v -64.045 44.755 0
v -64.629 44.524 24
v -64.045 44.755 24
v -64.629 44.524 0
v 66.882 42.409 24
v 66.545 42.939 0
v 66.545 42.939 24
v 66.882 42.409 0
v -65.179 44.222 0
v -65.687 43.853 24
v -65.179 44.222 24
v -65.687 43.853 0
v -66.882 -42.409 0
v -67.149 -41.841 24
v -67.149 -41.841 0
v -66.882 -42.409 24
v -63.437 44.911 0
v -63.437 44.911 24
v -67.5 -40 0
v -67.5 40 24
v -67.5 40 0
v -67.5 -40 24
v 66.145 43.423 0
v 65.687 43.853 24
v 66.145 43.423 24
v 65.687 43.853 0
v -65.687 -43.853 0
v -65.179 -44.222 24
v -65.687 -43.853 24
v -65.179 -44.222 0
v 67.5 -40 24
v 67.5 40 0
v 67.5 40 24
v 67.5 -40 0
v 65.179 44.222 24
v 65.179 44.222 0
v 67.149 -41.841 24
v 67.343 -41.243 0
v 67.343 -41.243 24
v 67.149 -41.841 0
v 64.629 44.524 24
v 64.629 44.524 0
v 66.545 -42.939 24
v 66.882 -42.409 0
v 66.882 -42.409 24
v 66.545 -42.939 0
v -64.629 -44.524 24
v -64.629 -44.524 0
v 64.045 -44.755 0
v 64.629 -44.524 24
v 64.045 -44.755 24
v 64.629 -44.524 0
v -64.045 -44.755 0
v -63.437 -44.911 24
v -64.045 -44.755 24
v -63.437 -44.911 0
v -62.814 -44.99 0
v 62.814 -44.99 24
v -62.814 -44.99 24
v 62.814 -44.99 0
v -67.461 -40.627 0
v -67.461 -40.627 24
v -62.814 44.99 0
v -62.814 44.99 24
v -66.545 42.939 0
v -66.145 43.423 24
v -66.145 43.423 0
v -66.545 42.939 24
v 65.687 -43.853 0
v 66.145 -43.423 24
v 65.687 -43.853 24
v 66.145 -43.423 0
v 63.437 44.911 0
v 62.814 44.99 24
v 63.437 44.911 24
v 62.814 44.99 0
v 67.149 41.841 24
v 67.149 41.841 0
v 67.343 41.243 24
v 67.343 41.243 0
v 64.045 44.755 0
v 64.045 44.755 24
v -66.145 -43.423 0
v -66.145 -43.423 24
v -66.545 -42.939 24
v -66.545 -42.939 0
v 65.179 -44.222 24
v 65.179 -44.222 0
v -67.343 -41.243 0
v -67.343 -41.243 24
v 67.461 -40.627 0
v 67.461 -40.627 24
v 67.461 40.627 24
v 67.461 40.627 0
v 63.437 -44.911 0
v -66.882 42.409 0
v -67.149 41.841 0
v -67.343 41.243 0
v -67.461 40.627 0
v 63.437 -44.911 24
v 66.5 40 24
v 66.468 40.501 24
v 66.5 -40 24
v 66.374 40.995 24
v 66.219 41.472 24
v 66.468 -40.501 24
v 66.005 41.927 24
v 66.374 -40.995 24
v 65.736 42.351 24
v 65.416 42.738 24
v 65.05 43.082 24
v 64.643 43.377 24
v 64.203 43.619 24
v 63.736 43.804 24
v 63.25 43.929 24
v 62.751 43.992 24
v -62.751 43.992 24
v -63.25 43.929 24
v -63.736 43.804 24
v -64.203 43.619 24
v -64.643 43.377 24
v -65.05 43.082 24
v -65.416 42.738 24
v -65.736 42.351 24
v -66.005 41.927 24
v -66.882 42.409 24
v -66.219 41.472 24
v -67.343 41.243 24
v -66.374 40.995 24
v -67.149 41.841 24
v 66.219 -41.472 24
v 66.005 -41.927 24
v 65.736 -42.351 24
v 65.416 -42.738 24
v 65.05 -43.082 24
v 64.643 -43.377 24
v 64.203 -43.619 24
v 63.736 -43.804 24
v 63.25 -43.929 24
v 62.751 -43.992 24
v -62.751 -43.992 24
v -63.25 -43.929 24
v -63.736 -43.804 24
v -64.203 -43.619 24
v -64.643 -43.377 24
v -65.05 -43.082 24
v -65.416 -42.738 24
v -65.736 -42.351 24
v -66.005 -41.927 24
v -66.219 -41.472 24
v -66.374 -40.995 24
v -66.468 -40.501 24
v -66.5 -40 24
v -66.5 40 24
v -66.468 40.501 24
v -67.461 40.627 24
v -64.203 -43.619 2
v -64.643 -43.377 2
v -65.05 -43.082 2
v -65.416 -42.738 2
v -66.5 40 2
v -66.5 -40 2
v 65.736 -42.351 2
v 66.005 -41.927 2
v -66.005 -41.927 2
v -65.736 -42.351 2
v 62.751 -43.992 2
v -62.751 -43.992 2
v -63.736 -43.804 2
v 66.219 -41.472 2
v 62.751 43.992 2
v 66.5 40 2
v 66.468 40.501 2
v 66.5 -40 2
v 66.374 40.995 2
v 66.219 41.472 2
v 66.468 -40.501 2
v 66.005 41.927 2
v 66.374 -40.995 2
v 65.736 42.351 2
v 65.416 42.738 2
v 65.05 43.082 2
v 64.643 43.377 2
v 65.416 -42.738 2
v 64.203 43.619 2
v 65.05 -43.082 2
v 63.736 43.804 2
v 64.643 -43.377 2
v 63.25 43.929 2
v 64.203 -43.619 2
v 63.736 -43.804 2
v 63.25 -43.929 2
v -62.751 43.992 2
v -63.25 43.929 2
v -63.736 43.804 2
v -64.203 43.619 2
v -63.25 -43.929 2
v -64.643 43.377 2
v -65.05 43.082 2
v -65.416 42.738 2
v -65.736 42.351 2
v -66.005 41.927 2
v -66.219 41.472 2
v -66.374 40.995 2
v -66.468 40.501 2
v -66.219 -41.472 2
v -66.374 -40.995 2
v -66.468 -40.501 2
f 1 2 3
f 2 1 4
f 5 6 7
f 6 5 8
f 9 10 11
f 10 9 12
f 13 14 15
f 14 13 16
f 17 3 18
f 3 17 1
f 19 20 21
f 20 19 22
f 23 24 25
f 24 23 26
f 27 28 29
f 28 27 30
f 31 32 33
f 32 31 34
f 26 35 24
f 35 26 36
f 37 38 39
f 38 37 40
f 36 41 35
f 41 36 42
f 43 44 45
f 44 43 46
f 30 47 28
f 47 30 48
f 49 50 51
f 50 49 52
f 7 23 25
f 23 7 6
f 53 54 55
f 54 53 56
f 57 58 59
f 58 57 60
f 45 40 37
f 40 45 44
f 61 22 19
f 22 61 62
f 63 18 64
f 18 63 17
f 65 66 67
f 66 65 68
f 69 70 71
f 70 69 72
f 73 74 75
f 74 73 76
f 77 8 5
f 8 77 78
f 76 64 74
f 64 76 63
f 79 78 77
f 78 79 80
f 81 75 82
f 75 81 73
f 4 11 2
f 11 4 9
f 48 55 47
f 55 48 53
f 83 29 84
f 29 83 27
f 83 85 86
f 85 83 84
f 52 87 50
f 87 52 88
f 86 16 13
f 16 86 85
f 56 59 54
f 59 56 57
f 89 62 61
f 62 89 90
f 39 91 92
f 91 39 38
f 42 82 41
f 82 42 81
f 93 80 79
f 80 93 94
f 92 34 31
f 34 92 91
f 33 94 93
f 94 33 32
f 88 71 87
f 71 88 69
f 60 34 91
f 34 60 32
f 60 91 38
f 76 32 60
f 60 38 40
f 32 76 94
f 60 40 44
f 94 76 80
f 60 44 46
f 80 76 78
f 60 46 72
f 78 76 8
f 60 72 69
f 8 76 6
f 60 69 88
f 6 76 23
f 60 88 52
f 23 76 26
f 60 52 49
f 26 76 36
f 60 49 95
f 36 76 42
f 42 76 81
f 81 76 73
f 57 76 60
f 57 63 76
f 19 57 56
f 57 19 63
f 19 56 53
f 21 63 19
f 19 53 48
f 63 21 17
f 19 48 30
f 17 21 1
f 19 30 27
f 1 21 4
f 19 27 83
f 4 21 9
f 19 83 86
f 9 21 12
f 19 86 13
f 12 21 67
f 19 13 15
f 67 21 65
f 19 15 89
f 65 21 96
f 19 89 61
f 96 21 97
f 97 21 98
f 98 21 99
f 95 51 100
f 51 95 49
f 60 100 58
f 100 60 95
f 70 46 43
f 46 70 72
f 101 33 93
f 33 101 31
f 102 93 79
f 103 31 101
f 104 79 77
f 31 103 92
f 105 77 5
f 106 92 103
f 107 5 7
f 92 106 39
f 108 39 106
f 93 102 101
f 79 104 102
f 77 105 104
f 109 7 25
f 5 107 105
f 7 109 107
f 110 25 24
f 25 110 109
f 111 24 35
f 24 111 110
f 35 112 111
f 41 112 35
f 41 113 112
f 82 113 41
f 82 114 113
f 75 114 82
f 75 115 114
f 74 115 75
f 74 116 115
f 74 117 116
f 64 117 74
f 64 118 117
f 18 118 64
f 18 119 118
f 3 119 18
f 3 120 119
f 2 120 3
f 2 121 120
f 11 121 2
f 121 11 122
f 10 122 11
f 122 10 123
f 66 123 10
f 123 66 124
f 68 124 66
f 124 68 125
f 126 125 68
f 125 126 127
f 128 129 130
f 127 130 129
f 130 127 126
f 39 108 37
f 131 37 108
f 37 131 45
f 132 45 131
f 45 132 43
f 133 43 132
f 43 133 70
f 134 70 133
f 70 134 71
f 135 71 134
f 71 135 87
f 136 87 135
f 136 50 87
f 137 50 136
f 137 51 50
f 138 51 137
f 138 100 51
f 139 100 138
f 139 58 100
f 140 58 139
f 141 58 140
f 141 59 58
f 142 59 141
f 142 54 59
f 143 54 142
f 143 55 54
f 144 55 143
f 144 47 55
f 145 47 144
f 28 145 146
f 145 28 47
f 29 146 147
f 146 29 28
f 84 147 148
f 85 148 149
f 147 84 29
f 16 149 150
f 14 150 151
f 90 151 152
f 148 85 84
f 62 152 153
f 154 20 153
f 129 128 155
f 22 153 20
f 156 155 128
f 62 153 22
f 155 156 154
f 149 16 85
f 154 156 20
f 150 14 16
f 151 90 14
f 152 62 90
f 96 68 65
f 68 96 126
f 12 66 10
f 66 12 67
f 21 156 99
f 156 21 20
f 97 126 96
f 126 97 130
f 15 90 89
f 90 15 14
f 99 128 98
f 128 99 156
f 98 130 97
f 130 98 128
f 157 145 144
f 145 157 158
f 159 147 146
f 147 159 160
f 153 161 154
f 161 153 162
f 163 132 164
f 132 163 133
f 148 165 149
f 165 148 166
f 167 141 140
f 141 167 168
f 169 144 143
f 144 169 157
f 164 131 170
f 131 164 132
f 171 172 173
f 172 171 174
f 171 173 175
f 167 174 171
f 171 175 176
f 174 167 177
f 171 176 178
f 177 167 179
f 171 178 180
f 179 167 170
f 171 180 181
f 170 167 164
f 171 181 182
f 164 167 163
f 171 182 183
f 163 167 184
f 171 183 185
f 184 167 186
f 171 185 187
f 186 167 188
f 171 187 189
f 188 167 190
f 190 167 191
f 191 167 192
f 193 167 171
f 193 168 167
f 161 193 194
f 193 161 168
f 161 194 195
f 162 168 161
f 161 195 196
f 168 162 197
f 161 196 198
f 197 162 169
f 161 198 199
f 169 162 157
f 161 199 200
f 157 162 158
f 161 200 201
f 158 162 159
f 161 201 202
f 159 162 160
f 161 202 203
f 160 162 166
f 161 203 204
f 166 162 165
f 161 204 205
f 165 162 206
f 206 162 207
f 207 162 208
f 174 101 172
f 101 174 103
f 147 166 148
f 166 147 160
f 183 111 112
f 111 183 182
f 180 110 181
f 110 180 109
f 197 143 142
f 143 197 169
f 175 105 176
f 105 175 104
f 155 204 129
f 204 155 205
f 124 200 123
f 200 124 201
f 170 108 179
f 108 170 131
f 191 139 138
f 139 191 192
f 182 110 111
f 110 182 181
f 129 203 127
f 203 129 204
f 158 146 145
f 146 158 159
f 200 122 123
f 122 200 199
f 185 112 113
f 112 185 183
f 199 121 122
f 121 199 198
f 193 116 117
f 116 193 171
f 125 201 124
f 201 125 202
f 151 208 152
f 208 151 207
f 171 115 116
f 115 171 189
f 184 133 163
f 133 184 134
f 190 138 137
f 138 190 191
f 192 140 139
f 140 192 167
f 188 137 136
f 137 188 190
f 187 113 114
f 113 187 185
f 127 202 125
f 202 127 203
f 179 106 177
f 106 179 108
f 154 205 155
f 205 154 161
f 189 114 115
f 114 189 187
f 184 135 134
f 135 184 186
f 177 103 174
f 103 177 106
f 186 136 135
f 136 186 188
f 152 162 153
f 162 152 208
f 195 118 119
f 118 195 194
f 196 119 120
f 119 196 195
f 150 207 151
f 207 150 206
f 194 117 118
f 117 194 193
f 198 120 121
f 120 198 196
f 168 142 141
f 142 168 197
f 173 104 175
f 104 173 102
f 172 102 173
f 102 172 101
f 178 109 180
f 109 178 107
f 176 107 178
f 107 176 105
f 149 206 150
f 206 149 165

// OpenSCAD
$fn = 50;


difference() {
	union() {
		hull() {
			translate(v = [-62.5000000000, 40.0000000000, 0]) {
				cylinder(h = 24, r = 5);
			}
			translate(v = [62.5000000000, 40.0000000000, 0]) {
				cylinder(h = 24, r = 5);
			}
			translate(v = [-62.5000000000, -40.0000000000, 0]) {
				cylinder(h = 24, r = 5);
			}
			translate(v = [62.5000000000, -40.0000000000, 0]) {
				cylinder(h = 24, r = 5);
			}
		}
	}
	union() {
		translate(v = [0, 0, 2]) {
			hull() {
				translate(v = [-62.5000000000, 40.0000000000, 0]) {
					cylinder(h = 22, r = 4);
				}
				translate(v = [62.5000000000, 40.0000000000, 0]) {
					cylinder(h = 22, r = 4);
				}
				translate(v = [-62.5000000000, -40.0000000000, 0]) {
					cylinder(h = 22, r = 4);
				}
				translate(v = [62.5000000000, -40.0000000000, 0]) {
					cylinder(h = 22, r = 4);
				}
			}
		}
	}
}
